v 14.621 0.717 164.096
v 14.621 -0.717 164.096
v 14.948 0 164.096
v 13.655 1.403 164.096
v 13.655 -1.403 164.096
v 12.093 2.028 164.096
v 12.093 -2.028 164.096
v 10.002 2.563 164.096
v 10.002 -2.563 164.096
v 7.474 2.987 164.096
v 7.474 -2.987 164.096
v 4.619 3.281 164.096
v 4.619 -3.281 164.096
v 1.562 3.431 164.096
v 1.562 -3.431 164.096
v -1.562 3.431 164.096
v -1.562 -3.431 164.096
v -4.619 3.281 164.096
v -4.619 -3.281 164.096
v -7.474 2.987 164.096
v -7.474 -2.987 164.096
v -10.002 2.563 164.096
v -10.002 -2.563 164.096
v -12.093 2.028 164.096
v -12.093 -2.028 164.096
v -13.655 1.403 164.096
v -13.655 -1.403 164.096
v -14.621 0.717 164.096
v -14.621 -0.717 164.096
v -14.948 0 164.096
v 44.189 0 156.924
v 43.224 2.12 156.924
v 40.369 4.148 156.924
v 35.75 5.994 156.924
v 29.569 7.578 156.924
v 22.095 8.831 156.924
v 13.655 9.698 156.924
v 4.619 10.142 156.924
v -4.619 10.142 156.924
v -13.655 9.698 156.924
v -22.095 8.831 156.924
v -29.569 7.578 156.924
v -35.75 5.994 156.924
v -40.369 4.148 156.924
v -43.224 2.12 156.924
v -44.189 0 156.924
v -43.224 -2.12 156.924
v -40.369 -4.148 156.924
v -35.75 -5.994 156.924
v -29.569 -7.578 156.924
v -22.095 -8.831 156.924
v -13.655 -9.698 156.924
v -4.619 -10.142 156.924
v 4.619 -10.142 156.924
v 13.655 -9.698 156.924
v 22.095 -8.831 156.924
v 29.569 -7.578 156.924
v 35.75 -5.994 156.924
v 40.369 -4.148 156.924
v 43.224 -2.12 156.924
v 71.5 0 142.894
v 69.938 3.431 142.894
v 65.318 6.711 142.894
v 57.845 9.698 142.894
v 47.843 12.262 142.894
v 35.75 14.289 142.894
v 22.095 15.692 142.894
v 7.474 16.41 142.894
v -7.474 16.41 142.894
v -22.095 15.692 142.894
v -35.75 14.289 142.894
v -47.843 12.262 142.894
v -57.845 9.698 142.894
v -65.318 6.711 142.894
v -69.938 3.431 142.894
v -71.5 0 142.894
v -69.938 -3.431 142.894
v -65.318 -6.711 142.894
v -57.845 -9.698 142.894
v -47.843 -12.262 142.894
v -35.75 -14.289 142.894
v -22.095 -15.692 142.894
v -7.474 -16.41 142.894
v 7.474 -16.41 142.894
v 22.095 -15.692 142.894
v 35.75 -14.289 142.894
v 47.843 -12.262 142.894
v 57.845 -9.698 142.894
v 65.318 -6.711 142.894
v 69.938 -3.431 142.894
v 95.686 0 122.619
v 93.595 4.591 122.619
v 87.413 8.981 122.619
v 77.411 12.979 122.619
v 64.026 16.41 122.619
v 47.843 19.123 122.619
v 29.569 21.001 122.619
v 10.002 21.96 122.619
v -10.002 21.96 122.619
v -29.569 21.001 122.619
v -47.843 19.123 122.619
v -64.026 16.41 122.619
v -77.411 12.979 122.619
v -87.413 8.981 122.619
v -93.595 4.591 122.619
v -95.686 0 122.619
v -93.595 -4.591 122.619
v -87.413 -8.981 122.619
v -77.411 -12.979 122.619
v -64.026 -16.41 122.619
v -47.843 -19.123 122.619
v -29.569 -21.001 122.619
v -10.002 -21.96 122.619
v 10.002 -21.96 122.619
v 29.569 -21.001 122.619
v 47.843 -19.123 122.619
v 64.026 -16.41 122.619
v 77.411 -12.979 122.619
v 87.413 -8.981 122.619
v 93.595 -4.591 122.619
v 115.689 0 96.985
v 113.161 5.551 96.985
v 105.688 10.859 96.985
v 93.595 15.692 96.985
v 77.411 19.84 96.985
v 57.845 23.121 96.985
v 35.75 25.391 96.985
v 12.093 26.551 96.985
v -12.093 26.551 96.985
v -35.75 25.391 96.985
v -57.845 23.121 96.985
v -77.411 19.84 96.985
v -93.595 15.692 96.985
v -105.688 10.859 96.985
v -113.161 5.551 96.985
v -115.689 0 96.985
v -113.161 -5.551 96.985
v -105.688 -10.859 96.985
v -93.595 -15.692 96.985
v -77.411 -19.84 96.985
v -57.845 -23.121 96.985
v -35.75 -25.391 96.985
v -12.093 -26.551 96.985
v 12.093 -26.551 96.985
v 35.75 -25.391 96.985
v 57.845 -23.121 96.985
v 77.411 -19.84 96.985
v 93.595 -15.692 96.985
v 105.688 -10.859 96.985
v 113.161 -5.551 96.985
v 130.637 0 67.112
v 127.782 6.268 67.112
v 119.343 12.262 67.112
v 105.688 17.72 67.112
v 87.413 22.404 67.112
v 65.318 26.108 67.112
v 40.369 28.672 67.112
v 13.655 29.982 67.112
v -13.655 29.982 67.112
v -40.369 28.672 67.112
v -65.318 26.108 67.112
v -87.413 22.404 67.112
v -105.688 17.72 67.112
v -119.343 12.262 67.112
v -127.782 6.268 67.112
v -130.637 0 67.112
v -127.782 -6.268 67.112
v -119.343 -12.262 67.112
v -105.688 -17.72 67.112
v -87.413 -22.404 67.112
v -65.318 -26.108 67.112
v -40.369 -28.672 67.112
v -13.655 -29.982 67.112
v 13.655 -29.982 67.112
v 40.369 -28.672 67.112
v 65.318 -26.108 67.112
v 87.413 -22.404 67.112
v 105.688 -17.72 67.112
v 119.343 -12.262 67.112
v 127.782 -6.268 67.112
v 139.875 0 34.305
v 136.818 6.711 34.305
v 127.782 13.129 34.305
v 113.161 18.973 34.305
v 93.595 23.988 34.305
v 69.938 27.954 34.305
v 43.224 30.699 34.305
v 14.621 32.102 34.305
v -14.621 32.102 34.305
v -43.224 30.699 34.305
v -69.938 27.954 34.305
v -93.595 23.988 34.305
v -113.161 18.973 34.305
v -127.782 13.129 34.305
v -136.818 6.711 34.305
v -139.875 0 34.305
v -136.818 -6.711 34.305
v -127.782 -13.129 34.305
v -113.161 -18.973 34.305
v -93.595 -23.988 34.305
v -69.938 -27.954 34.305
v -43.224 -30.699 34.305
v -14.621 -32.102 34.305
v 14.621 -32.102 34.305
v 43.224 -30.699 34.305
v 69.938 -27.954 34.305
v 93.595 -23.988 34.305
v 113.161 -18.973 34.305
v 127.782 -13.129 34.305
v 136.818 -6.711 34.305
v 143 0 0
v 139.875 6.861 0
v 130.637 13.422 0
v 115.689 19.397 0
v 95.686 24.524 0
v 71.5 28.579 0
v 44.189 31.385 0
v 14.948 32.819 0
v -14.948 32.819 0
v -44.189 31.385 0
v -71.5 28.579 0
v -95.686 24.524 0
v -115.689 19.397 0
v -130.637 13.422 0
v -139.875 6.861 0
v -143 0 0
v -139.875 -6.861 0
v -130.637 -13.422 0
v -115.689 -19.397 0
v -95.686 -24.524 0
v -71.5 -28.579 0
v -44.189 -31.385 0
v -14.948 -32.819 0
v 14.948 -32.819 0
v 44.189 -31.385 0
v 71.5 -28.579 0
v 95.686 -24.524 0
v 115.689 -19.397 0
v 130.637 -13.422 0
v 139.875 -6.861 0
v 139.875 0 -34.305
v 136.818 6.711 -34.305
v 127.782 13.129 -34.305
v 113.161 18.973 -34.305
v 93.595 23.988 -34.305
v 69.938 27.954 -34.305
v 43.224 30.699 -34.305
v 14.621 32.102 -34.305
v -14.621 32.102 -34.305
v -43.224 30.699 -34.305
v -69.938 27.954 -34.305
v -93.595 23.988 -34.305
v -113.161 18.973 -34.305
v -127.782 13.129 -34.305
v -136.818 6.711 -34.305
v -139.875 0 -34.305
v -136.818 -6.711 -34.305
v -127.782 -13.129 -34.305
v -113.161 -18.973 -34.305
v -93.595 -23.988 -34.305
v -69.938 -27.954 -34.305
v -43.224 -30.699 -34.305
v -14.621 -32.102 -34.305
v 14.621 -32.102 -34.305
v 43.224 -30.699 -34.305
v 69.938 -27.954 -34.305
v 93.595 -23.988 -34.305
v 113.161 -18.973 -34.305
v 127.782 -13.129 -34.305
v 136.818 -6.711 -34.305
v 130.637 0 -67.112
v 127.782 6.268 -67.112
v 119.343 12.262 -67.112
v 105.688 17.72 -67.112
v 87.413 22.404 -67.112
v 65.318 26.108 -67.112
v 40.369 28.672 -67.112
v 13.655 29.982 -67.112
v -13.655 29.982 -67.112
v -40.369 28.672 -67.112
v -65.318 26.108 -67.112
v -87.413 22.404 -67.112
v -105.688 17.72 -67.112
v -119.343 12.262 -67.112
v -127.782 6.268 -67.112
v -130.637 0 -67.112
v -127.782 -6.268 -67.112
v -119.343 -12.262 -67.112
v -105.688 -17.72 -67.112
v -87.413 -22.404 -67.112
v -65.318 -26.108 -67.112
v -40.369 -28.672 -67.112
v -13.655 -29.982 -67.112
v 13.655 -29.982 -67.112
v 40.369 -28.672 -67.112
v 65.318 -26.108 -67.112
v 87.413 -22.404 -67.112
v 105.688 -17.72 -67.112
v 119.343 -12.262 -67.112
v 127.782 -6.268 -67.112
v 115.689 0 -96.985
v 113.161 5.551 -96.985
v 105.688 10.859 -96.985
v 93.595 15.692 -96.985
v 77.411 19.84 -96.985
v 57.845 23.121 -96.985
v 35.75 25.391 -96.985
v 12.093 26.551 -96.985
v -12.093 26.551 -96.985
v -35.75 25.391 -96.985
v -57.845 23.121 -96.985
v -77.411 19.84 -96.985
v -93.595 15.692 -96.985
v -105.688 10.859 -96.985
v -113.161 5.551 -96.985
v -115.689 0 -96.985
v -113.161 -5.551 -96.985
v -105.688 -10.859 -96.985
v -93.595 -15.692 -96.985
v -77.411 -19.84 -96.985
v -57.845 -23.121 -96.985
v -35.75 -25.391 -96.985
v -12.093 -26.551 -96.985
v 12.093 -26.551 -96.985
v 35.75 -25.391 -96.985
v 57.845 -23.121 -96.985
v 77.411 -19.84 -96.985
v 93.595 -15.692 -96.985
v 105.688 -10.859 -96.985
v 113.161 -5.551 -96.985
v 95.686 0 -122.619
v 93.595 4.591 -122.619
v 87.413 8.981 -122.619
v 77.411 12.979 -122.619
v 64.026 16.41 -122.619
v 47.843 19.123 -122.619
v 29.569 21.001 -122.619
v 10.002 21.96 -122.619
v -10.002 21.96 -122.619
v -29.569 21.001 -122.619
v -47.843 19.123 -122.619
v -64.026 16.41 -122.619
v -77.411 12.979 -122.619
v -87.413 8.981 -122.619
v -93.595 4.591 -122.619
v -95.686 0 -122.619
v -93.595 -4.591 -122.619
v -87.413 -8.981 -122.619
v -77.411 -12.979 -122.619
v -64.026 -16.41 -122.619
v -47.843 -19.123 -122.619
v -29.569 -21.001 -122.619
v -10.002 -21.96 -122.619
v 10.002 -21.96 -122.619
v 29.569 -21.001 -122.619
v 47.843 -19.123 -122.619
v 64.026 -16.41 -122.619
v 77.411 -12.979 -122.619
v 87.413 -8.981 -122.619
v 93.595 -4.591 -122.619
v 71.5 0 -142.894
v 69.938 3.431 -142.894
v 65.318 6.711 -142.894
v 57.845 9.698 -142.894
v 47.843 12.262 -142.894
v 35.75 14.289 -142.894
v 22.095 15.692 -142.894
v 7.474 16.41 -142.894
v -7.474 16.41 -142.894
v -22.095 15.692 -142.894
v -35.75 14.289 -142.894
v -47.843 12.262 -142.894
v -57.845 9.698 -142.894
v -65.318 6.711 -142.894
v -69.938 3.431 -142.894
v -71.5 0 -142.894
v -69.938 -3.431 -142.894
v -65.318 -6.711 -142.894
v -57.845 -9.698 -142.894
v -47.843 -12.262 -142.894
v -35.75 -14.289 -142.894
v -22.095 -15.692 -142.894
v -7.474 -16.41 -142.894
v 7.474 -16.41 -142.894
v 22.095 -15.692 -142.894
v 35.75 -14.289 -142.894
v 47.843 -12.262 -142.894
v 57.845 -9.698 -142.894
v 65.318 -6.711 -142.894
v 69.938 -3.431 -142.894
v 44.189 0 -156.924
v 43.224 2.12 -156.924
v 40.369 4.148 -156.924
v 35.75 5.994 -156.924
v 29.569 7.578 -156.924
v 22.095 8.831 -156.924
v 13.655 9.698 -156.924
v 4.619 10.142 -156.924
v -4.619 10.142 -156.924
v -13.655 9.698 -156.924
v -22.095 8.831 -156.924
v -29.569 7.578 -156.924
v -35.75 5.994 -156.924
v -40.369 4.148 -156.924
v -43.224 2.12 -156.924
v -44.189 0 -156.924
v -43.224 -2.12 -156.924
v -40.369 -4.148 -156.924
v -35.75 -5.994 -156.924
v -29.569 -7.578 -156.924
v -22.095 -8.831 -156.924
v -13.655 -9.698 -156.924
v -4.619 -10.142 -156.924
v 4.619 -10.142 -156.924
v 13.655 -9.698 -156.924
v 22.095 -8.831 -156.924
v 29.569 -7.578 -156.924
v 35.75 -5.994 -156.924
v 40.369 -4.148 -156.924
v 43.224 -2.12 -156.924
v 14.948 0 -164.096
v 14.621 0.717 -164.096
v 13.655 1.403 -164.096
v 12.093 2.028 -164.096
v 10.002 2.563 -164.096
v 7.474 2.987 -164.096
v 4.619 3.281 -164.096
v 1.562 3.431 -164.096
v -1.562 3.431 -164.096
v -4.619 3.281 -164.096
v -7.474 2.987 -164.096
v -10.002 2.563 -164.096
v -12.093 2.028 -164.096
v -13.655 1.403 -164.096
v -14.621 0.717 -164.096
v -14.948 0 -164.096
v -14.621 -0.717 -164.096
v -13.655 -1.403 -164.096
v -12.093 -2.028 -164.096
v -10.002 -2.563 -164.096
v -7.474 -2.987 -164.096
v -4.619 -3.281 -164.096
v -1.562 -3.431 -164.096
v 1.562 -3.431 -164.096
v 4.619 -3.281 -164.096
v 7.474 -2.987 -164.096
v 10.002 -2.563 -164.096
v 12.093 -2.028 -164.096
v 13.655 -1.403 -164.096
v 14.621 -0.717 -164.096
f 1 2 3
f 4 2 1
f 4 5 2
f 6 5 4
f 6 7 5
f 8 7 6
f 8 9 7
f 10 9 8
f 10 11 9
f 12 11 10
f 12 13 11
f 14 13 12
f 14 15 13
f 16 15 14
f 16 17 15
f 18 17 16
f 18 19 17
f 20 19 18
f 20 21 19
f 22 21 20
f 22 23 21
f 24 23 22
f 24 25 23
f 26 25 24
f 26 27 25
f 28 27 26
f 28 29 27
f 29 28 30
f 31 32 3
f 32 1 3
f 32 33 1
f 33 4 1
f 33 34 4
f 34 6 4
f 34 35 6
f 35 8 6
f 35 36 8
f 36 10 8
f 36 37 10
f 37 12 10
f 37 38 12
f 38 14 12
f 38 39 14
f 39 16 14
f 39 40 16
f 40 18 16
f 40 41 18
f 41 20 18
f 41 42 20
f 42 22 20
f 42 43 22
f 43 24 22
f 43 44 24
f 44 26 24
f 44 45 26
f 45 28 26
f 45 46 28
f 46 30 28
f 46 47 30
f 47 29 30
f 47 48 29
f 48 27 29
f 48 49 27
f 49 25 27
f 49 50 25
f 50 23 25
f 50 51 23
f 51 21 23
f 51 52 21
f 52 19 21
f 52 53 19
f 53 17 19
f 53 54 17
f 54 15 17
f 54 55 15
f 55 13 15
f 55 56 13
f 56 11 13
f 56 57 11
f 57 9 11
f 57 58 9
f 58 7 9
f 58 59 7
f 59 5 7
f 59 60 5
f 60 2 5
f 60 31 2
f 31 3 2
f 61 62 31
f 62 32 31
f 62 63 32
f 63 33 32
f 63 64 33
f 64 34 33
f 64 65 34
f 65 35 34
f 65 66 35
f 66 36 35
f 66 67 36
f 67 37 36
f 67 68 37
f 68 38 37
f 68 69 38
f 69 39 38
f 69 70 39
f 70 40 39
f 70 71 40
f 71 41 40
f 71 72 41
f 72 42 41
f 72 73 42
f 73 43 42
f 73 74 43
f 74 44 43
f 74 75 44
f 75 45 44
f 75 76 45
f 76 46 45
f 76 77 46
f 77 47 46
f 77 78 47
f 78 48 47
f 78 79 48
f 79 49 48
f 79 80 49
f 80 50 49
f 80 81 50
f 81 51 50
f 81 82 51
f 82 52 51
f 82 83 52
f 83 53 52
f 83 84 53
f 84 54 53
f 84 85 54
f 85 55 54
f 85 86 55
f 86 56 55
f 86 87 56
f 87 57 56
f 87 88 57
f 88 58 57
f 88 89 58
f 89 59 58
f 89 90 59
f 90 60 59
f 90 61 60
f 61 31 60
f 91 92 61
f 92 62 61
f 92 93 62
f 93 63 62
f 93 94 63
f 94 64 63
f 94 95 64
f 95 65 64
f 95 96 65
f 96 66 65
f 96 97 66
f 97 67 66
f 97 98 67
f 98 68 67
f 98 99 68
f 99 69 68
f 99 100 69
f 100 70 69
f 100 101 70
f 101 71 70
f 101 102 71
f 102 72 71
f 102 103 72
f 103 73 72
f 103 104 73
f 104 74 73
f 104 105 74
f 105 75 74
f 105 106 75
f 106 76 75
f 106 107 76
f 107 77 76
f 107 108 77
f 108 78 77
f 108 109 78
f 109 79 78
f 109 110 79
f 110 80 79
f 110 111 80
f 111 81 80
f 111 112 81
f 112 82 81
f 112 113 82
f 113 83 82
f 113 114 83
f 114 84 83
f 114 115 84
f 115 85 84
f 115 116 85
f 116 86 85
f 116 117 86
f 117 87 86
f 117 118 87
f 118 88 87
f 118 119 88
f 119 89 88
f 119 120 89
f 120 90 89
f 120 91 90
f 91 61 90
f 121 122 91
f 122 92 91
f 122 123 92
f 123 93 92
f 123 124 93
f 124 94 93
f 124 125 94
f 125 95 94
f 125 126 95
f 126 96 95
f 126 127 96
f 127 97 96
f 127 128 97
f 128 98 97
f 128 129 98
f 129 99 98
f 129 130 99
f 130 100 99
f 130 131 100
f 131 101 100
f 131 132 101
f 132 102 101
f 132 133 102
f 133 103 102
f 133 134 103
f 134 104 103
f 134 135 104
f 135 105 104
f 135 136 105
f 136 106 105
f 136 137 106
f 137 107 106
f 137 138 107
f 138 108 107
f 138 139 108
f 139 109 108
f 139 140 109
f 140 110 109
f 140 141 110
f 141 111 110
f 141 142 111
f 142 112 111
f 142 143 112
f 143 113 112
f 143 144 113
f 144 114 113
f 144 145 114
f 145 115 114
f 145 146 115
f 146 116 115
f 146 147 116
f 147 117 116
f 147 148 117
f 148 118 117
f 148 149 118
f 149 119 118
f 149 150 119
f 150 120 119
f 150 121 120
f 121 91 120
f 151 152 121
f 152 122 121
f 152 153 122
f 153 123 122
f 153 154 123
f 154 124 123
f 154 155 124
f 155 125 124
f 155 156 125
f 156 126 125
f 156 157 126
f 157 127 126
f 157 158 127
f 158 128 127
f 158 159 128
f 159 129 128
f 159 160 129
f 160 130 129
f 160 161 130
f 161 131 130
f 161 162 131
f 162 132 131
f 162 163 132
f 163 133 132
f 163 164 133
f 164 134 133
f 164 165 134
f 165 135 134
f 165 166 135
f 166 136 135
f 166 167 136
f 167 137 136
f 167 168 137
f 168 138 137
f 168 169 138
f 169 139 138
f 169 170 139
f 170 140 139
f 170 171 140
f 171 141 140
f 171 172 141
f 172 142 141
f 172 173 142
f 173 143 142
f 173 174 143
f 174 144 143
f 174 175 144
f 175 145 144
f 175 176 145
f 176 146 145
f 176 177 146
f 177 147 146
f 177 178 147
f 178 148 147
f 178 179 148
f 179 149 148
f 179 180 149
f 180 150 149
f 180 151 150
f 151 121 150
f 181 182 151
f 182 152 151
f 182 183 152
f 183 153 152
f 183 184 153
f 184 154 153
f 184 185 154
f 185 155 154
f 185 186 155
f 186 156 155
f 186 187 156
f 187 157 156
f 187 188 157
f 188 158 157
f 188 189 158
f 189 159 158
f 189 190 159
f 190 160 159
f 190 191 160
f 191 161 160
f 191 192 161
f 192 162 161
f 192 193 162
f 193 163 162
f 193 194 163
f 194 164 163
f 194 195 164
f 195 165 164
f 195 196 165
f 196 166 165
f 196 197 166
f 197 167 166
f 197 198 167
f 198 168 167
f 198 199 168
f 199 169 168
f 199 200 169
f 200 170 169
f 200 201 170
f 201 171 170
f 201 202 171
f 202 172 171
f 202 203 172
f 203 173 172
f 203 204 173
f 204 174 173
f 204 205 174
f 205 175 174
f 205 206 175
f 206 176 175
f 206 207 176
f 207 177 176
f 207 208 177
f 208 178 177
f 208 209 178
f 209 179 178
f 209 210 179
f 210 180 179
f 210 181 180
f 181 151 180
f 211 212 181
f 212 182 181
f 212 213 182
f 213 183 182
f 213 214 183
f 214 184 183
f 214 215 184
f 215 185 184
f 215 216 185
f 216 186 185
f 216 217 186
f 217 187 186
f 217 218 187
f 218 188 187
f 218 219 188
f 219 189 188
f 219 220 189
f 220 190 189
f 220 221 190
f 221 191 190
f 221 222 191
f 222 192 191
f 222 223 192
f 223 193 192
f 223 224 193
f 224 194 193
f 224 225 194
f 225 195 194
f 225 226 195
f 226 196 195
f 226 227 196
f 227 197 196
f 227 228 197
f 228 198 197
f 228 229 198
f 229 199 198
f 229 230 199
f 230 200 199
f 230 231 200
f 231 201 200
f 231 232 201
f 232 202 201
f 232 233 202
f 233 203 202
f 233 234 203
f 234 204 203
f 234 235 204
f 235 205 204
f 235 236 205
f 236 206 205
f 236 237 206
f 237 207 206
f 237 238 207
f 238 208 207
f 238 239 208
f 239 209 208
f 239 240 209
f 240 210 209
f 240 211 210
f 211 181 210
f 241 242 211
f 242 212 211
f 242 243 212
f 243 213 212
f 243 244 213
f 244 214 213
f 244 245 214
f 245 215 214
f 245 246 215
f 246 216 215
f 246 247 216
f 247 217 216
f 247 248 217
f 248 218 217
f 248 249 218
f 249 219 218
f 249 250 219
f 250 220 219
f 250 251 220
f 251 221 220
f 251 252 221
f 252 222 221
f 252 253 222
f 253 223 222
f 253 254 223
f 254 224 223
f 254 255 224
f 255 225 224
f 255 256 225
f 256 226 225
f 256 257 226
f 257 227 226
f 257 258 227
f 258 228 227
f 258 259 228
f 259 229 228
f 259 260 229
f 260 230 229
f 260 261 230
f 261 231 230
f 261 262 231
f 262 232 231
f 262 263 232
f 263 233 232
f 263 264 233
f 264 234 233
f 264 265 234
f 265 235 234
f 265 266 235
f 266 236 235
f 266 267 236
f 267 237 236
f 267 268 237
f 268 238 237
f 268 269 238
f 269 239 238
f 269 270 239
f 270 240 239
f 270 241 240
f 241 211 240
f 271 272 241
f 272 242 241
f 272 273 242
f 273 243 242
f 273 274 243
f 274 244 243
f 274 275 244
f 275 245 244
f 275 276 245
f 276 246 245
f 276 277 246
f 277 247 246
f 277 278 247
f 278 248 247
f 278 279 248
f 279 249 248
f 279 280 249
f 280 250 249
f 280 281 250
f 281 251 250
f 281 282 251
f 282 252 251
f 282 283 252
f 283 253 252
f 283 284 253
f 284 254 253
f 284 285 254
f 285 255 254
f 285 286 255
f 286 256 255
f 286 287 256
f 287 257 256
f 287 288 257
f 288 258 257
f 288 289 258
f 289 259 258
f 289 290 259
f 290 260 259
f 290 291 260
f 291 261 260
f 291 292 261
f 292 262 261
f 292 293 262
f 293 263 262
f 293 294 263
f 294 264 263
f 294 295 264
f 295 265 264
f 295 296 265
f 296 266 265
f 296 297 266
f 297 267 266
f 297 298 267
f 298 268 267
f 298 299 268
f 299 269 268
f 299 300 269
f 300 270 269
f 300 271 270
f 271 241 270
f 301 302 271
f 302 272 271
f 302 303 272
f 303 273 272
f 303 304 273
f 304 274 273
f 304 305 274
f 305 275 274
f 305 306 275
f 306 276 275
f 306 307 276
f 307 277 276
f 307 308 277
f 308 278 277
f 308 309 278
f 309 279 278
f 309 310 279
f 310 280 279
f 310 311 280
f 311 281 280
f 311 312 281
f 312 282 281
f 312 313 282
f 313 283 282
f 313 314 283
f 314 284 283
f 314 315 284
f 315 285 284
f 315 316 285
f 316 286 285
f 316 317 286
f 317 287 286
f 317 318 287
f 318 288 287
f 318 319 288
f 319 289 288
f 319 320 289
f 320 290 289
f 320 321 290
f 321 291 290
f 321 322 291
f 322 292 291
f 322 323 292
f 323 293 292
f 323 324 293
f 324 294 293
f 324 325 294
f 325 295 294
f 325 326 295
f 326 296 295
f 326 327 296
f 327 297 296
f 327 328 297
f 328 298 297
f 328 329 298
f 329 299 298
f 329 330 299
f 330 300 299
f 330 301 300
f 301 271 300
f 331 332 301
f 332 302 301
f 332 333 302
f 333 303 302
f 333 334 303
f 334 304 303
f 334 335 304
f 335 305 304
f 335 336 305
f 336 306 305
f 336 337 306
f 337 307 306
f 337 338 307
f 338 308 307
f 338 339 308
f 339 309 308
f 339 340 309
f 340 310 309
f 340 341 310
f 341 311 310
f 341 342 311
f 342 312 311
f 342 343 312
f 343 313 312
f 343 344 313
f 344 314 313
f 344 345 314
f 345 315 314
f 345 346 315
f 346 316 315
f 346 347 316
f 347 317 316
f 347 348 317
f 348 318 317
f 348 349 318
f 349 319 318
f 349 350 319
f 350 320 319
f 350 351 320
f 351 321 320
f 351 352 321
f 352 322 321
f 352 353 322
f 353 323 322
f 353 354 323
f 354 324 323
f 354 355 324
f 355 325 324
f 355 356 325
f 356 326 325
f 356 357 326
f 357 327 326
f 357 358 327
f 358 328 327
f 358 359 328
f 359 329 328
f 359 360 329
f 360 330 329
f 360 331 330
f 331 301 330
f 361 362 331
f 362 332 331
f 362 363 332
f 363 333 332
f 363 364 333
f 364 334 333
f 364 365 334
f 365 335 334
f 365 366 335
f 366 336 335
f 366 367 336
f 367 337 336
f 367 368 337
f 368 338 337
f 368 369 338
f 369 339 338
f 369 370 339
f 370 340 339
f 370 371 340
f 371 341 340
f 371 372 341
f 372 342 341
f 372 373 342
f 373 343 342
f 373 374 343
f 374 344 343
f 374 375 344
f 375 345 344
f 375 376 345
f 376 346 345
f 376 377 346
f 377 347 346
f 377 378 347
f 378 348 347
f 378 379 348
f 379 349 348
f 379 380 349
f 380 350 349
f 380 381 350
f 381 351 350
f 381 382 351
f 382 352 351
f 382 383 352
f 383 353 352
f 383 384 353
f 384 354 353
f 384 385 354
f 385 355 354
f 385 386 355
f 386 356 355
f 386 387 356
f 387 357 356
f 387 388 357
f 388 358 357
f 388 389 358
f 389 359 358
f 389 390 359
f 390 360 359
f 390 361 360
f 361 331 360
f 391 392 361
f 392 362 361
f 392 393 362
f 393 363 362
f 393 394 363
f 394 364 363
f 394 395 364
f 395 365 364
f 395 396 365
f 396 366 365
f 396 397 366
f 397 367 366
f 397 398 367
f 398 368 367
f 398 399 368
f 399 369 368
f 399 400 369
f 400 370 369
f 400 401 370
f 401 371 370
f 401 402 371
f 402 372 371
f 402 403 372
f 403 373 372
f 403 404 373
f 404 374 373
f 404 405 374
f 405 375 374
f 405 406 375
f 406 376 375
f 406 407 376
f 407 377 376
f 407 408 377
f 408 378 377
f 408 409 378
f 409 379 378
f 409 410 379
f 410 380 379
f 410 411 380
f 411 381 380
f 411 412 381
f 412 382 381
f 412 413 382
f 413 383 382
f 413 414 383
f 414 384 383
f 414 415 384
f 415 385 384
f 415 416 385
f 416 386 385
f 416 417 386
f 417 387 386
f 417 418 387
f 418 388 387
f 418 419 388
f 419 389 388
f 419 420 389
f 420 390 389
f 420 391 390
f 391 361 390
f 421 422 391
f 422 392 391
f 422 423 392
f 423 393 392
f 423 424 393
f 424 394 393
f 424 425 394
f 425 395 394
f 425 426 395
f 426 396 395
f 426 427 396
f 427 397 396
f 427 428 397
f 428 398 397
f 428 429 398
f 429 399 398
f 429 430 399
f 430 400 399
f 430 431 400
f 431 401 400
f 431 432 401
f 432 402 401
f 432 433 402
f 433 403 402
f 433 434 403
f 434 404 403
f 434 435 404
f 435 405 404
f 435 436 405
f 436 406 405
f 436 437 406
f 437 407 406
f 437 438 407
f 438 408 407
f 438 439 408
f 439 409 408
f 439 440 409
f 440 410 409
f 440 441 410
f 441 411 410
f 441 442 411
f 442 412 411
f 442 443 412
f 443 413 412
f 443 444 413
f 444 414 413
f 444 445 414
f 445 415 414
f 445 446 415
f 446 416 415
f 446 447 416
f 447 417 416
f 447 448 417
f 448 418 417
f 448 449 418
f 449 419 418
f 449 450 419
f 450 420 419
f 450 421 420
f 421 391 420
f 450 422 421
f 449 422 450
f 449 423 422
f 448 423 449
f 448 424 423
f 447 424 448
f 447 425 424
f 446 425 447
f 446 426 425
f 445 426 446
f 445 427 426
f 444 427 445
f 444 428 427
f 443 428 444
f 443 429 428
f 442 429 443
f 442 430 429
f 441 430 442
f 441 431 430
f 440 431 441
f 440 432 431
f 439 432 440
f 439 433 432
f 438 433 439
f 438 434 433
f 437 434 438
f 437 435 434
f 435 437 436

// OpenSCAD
// Generated by SolidPython 1.0.1 on 2020-07-29 00:46:50


scale(v = [13, 3, 15]) {
	sphere(r = 11);
}
/***********************************************
*********      SolidPython code:      **********
************************************************
 
# import packages: SolidPython
from solid import *
from solid.utils import *
from itertools import chain, combinations, permutations


class Resize:

    def __init__(self, scad_file):
        self.scad_file = scad_file
        #self.scad_file = import_scad(scad_file)
        # cone/cylinder param:
        self.r1 = 0
        self.r2 = 0
        self.h = 0
        # rectangular prism param:
        self.w = 0
        self.l = 0
        # ellipse param:
        self.r = 0

    # import OpenScad code (file name corresponds to shape)


    # classify shape + parameters
    def assign(self, param1, param2, param3):
        if self.scad_file == 'cone.scad':
            self.r1 = param1
            self.r2 = param2
            self.h = param3
        elif self.scad_file == 'cylinder.scad':
            self.r1 = param1
            self.r2 = param2
            self.h = param3
        elif self.scad_file == 'rectangularPrism.scad':
            self.h = param1
            self.l = param2
            self.w = param3
        else:
            self.r = param1
            self.h = param2

    # resize parameters
    def iterate(self):
        x = range(3, 20, 2)
        i = 1
        if self.scad_file == 'cone.scad':
            tempList = list(permutations(x, 2))
            for temp in tempList:
                param1 = temp[0]
                param2 = temp[1]
                filepath = 'produced_scad_files/' + 'cone' + str(param1) + '_' + str(param2) + '_' + '.scad'
                scad_render_to_file(cylinder(h=param1, r1=param2, r2=0), filepath)

        elif self.scad_file == 'cylinder.scad':
            tempList = list(permutations(x, 3))
            for temp in tempList:
                param1 = temp[0]
                param2 = temp[1]
                filepath = 'produced_scad_files/' + 'cylinder' + str(param1) + '_' + str(param2) + '_' + '.scad'
                scad_render_to_file(cylinder(h=param1, r1=param2, r2=param2), filepath)

        elif self.scad_file == 'rectangularPrism.scad':
            tempList = list(permutations(x, 3))
            for temp in tempList:
                param1 = temp[0]
                param2 = temp[1]
                param3 = temp[2]
                filepath = 'produced_scad_files/' + 'rectangularPrism' + str(param1) + '_' + str(param2) + '_' + str(
                    param3) + '.scad'
                scad_render_to_file(cube(size=(param1, param2, param3)), filepath)

        elif self.scad_file == 'ellipse.scad':
            tempList = list(permutations(x, 4))
            for temp in tempList:
                param1 = temp[0]
                param2 = temp[1]
                param3 = temp[2]
                param4 = temp[3]
                filepath = 'produced_scad_files/' + 'ellipse' + str(param1) + '_' + str(param2) + '_' + str(param3) + '_' + str(param4) + '.scad'
                scad_render_to_file(scale([param1, param2, param3])(sphere(r=param4)), filepath)

    def render_to_scadfile(self):
        scad_render_to_file(scad, 'example.scad') 
 
************************************************/
